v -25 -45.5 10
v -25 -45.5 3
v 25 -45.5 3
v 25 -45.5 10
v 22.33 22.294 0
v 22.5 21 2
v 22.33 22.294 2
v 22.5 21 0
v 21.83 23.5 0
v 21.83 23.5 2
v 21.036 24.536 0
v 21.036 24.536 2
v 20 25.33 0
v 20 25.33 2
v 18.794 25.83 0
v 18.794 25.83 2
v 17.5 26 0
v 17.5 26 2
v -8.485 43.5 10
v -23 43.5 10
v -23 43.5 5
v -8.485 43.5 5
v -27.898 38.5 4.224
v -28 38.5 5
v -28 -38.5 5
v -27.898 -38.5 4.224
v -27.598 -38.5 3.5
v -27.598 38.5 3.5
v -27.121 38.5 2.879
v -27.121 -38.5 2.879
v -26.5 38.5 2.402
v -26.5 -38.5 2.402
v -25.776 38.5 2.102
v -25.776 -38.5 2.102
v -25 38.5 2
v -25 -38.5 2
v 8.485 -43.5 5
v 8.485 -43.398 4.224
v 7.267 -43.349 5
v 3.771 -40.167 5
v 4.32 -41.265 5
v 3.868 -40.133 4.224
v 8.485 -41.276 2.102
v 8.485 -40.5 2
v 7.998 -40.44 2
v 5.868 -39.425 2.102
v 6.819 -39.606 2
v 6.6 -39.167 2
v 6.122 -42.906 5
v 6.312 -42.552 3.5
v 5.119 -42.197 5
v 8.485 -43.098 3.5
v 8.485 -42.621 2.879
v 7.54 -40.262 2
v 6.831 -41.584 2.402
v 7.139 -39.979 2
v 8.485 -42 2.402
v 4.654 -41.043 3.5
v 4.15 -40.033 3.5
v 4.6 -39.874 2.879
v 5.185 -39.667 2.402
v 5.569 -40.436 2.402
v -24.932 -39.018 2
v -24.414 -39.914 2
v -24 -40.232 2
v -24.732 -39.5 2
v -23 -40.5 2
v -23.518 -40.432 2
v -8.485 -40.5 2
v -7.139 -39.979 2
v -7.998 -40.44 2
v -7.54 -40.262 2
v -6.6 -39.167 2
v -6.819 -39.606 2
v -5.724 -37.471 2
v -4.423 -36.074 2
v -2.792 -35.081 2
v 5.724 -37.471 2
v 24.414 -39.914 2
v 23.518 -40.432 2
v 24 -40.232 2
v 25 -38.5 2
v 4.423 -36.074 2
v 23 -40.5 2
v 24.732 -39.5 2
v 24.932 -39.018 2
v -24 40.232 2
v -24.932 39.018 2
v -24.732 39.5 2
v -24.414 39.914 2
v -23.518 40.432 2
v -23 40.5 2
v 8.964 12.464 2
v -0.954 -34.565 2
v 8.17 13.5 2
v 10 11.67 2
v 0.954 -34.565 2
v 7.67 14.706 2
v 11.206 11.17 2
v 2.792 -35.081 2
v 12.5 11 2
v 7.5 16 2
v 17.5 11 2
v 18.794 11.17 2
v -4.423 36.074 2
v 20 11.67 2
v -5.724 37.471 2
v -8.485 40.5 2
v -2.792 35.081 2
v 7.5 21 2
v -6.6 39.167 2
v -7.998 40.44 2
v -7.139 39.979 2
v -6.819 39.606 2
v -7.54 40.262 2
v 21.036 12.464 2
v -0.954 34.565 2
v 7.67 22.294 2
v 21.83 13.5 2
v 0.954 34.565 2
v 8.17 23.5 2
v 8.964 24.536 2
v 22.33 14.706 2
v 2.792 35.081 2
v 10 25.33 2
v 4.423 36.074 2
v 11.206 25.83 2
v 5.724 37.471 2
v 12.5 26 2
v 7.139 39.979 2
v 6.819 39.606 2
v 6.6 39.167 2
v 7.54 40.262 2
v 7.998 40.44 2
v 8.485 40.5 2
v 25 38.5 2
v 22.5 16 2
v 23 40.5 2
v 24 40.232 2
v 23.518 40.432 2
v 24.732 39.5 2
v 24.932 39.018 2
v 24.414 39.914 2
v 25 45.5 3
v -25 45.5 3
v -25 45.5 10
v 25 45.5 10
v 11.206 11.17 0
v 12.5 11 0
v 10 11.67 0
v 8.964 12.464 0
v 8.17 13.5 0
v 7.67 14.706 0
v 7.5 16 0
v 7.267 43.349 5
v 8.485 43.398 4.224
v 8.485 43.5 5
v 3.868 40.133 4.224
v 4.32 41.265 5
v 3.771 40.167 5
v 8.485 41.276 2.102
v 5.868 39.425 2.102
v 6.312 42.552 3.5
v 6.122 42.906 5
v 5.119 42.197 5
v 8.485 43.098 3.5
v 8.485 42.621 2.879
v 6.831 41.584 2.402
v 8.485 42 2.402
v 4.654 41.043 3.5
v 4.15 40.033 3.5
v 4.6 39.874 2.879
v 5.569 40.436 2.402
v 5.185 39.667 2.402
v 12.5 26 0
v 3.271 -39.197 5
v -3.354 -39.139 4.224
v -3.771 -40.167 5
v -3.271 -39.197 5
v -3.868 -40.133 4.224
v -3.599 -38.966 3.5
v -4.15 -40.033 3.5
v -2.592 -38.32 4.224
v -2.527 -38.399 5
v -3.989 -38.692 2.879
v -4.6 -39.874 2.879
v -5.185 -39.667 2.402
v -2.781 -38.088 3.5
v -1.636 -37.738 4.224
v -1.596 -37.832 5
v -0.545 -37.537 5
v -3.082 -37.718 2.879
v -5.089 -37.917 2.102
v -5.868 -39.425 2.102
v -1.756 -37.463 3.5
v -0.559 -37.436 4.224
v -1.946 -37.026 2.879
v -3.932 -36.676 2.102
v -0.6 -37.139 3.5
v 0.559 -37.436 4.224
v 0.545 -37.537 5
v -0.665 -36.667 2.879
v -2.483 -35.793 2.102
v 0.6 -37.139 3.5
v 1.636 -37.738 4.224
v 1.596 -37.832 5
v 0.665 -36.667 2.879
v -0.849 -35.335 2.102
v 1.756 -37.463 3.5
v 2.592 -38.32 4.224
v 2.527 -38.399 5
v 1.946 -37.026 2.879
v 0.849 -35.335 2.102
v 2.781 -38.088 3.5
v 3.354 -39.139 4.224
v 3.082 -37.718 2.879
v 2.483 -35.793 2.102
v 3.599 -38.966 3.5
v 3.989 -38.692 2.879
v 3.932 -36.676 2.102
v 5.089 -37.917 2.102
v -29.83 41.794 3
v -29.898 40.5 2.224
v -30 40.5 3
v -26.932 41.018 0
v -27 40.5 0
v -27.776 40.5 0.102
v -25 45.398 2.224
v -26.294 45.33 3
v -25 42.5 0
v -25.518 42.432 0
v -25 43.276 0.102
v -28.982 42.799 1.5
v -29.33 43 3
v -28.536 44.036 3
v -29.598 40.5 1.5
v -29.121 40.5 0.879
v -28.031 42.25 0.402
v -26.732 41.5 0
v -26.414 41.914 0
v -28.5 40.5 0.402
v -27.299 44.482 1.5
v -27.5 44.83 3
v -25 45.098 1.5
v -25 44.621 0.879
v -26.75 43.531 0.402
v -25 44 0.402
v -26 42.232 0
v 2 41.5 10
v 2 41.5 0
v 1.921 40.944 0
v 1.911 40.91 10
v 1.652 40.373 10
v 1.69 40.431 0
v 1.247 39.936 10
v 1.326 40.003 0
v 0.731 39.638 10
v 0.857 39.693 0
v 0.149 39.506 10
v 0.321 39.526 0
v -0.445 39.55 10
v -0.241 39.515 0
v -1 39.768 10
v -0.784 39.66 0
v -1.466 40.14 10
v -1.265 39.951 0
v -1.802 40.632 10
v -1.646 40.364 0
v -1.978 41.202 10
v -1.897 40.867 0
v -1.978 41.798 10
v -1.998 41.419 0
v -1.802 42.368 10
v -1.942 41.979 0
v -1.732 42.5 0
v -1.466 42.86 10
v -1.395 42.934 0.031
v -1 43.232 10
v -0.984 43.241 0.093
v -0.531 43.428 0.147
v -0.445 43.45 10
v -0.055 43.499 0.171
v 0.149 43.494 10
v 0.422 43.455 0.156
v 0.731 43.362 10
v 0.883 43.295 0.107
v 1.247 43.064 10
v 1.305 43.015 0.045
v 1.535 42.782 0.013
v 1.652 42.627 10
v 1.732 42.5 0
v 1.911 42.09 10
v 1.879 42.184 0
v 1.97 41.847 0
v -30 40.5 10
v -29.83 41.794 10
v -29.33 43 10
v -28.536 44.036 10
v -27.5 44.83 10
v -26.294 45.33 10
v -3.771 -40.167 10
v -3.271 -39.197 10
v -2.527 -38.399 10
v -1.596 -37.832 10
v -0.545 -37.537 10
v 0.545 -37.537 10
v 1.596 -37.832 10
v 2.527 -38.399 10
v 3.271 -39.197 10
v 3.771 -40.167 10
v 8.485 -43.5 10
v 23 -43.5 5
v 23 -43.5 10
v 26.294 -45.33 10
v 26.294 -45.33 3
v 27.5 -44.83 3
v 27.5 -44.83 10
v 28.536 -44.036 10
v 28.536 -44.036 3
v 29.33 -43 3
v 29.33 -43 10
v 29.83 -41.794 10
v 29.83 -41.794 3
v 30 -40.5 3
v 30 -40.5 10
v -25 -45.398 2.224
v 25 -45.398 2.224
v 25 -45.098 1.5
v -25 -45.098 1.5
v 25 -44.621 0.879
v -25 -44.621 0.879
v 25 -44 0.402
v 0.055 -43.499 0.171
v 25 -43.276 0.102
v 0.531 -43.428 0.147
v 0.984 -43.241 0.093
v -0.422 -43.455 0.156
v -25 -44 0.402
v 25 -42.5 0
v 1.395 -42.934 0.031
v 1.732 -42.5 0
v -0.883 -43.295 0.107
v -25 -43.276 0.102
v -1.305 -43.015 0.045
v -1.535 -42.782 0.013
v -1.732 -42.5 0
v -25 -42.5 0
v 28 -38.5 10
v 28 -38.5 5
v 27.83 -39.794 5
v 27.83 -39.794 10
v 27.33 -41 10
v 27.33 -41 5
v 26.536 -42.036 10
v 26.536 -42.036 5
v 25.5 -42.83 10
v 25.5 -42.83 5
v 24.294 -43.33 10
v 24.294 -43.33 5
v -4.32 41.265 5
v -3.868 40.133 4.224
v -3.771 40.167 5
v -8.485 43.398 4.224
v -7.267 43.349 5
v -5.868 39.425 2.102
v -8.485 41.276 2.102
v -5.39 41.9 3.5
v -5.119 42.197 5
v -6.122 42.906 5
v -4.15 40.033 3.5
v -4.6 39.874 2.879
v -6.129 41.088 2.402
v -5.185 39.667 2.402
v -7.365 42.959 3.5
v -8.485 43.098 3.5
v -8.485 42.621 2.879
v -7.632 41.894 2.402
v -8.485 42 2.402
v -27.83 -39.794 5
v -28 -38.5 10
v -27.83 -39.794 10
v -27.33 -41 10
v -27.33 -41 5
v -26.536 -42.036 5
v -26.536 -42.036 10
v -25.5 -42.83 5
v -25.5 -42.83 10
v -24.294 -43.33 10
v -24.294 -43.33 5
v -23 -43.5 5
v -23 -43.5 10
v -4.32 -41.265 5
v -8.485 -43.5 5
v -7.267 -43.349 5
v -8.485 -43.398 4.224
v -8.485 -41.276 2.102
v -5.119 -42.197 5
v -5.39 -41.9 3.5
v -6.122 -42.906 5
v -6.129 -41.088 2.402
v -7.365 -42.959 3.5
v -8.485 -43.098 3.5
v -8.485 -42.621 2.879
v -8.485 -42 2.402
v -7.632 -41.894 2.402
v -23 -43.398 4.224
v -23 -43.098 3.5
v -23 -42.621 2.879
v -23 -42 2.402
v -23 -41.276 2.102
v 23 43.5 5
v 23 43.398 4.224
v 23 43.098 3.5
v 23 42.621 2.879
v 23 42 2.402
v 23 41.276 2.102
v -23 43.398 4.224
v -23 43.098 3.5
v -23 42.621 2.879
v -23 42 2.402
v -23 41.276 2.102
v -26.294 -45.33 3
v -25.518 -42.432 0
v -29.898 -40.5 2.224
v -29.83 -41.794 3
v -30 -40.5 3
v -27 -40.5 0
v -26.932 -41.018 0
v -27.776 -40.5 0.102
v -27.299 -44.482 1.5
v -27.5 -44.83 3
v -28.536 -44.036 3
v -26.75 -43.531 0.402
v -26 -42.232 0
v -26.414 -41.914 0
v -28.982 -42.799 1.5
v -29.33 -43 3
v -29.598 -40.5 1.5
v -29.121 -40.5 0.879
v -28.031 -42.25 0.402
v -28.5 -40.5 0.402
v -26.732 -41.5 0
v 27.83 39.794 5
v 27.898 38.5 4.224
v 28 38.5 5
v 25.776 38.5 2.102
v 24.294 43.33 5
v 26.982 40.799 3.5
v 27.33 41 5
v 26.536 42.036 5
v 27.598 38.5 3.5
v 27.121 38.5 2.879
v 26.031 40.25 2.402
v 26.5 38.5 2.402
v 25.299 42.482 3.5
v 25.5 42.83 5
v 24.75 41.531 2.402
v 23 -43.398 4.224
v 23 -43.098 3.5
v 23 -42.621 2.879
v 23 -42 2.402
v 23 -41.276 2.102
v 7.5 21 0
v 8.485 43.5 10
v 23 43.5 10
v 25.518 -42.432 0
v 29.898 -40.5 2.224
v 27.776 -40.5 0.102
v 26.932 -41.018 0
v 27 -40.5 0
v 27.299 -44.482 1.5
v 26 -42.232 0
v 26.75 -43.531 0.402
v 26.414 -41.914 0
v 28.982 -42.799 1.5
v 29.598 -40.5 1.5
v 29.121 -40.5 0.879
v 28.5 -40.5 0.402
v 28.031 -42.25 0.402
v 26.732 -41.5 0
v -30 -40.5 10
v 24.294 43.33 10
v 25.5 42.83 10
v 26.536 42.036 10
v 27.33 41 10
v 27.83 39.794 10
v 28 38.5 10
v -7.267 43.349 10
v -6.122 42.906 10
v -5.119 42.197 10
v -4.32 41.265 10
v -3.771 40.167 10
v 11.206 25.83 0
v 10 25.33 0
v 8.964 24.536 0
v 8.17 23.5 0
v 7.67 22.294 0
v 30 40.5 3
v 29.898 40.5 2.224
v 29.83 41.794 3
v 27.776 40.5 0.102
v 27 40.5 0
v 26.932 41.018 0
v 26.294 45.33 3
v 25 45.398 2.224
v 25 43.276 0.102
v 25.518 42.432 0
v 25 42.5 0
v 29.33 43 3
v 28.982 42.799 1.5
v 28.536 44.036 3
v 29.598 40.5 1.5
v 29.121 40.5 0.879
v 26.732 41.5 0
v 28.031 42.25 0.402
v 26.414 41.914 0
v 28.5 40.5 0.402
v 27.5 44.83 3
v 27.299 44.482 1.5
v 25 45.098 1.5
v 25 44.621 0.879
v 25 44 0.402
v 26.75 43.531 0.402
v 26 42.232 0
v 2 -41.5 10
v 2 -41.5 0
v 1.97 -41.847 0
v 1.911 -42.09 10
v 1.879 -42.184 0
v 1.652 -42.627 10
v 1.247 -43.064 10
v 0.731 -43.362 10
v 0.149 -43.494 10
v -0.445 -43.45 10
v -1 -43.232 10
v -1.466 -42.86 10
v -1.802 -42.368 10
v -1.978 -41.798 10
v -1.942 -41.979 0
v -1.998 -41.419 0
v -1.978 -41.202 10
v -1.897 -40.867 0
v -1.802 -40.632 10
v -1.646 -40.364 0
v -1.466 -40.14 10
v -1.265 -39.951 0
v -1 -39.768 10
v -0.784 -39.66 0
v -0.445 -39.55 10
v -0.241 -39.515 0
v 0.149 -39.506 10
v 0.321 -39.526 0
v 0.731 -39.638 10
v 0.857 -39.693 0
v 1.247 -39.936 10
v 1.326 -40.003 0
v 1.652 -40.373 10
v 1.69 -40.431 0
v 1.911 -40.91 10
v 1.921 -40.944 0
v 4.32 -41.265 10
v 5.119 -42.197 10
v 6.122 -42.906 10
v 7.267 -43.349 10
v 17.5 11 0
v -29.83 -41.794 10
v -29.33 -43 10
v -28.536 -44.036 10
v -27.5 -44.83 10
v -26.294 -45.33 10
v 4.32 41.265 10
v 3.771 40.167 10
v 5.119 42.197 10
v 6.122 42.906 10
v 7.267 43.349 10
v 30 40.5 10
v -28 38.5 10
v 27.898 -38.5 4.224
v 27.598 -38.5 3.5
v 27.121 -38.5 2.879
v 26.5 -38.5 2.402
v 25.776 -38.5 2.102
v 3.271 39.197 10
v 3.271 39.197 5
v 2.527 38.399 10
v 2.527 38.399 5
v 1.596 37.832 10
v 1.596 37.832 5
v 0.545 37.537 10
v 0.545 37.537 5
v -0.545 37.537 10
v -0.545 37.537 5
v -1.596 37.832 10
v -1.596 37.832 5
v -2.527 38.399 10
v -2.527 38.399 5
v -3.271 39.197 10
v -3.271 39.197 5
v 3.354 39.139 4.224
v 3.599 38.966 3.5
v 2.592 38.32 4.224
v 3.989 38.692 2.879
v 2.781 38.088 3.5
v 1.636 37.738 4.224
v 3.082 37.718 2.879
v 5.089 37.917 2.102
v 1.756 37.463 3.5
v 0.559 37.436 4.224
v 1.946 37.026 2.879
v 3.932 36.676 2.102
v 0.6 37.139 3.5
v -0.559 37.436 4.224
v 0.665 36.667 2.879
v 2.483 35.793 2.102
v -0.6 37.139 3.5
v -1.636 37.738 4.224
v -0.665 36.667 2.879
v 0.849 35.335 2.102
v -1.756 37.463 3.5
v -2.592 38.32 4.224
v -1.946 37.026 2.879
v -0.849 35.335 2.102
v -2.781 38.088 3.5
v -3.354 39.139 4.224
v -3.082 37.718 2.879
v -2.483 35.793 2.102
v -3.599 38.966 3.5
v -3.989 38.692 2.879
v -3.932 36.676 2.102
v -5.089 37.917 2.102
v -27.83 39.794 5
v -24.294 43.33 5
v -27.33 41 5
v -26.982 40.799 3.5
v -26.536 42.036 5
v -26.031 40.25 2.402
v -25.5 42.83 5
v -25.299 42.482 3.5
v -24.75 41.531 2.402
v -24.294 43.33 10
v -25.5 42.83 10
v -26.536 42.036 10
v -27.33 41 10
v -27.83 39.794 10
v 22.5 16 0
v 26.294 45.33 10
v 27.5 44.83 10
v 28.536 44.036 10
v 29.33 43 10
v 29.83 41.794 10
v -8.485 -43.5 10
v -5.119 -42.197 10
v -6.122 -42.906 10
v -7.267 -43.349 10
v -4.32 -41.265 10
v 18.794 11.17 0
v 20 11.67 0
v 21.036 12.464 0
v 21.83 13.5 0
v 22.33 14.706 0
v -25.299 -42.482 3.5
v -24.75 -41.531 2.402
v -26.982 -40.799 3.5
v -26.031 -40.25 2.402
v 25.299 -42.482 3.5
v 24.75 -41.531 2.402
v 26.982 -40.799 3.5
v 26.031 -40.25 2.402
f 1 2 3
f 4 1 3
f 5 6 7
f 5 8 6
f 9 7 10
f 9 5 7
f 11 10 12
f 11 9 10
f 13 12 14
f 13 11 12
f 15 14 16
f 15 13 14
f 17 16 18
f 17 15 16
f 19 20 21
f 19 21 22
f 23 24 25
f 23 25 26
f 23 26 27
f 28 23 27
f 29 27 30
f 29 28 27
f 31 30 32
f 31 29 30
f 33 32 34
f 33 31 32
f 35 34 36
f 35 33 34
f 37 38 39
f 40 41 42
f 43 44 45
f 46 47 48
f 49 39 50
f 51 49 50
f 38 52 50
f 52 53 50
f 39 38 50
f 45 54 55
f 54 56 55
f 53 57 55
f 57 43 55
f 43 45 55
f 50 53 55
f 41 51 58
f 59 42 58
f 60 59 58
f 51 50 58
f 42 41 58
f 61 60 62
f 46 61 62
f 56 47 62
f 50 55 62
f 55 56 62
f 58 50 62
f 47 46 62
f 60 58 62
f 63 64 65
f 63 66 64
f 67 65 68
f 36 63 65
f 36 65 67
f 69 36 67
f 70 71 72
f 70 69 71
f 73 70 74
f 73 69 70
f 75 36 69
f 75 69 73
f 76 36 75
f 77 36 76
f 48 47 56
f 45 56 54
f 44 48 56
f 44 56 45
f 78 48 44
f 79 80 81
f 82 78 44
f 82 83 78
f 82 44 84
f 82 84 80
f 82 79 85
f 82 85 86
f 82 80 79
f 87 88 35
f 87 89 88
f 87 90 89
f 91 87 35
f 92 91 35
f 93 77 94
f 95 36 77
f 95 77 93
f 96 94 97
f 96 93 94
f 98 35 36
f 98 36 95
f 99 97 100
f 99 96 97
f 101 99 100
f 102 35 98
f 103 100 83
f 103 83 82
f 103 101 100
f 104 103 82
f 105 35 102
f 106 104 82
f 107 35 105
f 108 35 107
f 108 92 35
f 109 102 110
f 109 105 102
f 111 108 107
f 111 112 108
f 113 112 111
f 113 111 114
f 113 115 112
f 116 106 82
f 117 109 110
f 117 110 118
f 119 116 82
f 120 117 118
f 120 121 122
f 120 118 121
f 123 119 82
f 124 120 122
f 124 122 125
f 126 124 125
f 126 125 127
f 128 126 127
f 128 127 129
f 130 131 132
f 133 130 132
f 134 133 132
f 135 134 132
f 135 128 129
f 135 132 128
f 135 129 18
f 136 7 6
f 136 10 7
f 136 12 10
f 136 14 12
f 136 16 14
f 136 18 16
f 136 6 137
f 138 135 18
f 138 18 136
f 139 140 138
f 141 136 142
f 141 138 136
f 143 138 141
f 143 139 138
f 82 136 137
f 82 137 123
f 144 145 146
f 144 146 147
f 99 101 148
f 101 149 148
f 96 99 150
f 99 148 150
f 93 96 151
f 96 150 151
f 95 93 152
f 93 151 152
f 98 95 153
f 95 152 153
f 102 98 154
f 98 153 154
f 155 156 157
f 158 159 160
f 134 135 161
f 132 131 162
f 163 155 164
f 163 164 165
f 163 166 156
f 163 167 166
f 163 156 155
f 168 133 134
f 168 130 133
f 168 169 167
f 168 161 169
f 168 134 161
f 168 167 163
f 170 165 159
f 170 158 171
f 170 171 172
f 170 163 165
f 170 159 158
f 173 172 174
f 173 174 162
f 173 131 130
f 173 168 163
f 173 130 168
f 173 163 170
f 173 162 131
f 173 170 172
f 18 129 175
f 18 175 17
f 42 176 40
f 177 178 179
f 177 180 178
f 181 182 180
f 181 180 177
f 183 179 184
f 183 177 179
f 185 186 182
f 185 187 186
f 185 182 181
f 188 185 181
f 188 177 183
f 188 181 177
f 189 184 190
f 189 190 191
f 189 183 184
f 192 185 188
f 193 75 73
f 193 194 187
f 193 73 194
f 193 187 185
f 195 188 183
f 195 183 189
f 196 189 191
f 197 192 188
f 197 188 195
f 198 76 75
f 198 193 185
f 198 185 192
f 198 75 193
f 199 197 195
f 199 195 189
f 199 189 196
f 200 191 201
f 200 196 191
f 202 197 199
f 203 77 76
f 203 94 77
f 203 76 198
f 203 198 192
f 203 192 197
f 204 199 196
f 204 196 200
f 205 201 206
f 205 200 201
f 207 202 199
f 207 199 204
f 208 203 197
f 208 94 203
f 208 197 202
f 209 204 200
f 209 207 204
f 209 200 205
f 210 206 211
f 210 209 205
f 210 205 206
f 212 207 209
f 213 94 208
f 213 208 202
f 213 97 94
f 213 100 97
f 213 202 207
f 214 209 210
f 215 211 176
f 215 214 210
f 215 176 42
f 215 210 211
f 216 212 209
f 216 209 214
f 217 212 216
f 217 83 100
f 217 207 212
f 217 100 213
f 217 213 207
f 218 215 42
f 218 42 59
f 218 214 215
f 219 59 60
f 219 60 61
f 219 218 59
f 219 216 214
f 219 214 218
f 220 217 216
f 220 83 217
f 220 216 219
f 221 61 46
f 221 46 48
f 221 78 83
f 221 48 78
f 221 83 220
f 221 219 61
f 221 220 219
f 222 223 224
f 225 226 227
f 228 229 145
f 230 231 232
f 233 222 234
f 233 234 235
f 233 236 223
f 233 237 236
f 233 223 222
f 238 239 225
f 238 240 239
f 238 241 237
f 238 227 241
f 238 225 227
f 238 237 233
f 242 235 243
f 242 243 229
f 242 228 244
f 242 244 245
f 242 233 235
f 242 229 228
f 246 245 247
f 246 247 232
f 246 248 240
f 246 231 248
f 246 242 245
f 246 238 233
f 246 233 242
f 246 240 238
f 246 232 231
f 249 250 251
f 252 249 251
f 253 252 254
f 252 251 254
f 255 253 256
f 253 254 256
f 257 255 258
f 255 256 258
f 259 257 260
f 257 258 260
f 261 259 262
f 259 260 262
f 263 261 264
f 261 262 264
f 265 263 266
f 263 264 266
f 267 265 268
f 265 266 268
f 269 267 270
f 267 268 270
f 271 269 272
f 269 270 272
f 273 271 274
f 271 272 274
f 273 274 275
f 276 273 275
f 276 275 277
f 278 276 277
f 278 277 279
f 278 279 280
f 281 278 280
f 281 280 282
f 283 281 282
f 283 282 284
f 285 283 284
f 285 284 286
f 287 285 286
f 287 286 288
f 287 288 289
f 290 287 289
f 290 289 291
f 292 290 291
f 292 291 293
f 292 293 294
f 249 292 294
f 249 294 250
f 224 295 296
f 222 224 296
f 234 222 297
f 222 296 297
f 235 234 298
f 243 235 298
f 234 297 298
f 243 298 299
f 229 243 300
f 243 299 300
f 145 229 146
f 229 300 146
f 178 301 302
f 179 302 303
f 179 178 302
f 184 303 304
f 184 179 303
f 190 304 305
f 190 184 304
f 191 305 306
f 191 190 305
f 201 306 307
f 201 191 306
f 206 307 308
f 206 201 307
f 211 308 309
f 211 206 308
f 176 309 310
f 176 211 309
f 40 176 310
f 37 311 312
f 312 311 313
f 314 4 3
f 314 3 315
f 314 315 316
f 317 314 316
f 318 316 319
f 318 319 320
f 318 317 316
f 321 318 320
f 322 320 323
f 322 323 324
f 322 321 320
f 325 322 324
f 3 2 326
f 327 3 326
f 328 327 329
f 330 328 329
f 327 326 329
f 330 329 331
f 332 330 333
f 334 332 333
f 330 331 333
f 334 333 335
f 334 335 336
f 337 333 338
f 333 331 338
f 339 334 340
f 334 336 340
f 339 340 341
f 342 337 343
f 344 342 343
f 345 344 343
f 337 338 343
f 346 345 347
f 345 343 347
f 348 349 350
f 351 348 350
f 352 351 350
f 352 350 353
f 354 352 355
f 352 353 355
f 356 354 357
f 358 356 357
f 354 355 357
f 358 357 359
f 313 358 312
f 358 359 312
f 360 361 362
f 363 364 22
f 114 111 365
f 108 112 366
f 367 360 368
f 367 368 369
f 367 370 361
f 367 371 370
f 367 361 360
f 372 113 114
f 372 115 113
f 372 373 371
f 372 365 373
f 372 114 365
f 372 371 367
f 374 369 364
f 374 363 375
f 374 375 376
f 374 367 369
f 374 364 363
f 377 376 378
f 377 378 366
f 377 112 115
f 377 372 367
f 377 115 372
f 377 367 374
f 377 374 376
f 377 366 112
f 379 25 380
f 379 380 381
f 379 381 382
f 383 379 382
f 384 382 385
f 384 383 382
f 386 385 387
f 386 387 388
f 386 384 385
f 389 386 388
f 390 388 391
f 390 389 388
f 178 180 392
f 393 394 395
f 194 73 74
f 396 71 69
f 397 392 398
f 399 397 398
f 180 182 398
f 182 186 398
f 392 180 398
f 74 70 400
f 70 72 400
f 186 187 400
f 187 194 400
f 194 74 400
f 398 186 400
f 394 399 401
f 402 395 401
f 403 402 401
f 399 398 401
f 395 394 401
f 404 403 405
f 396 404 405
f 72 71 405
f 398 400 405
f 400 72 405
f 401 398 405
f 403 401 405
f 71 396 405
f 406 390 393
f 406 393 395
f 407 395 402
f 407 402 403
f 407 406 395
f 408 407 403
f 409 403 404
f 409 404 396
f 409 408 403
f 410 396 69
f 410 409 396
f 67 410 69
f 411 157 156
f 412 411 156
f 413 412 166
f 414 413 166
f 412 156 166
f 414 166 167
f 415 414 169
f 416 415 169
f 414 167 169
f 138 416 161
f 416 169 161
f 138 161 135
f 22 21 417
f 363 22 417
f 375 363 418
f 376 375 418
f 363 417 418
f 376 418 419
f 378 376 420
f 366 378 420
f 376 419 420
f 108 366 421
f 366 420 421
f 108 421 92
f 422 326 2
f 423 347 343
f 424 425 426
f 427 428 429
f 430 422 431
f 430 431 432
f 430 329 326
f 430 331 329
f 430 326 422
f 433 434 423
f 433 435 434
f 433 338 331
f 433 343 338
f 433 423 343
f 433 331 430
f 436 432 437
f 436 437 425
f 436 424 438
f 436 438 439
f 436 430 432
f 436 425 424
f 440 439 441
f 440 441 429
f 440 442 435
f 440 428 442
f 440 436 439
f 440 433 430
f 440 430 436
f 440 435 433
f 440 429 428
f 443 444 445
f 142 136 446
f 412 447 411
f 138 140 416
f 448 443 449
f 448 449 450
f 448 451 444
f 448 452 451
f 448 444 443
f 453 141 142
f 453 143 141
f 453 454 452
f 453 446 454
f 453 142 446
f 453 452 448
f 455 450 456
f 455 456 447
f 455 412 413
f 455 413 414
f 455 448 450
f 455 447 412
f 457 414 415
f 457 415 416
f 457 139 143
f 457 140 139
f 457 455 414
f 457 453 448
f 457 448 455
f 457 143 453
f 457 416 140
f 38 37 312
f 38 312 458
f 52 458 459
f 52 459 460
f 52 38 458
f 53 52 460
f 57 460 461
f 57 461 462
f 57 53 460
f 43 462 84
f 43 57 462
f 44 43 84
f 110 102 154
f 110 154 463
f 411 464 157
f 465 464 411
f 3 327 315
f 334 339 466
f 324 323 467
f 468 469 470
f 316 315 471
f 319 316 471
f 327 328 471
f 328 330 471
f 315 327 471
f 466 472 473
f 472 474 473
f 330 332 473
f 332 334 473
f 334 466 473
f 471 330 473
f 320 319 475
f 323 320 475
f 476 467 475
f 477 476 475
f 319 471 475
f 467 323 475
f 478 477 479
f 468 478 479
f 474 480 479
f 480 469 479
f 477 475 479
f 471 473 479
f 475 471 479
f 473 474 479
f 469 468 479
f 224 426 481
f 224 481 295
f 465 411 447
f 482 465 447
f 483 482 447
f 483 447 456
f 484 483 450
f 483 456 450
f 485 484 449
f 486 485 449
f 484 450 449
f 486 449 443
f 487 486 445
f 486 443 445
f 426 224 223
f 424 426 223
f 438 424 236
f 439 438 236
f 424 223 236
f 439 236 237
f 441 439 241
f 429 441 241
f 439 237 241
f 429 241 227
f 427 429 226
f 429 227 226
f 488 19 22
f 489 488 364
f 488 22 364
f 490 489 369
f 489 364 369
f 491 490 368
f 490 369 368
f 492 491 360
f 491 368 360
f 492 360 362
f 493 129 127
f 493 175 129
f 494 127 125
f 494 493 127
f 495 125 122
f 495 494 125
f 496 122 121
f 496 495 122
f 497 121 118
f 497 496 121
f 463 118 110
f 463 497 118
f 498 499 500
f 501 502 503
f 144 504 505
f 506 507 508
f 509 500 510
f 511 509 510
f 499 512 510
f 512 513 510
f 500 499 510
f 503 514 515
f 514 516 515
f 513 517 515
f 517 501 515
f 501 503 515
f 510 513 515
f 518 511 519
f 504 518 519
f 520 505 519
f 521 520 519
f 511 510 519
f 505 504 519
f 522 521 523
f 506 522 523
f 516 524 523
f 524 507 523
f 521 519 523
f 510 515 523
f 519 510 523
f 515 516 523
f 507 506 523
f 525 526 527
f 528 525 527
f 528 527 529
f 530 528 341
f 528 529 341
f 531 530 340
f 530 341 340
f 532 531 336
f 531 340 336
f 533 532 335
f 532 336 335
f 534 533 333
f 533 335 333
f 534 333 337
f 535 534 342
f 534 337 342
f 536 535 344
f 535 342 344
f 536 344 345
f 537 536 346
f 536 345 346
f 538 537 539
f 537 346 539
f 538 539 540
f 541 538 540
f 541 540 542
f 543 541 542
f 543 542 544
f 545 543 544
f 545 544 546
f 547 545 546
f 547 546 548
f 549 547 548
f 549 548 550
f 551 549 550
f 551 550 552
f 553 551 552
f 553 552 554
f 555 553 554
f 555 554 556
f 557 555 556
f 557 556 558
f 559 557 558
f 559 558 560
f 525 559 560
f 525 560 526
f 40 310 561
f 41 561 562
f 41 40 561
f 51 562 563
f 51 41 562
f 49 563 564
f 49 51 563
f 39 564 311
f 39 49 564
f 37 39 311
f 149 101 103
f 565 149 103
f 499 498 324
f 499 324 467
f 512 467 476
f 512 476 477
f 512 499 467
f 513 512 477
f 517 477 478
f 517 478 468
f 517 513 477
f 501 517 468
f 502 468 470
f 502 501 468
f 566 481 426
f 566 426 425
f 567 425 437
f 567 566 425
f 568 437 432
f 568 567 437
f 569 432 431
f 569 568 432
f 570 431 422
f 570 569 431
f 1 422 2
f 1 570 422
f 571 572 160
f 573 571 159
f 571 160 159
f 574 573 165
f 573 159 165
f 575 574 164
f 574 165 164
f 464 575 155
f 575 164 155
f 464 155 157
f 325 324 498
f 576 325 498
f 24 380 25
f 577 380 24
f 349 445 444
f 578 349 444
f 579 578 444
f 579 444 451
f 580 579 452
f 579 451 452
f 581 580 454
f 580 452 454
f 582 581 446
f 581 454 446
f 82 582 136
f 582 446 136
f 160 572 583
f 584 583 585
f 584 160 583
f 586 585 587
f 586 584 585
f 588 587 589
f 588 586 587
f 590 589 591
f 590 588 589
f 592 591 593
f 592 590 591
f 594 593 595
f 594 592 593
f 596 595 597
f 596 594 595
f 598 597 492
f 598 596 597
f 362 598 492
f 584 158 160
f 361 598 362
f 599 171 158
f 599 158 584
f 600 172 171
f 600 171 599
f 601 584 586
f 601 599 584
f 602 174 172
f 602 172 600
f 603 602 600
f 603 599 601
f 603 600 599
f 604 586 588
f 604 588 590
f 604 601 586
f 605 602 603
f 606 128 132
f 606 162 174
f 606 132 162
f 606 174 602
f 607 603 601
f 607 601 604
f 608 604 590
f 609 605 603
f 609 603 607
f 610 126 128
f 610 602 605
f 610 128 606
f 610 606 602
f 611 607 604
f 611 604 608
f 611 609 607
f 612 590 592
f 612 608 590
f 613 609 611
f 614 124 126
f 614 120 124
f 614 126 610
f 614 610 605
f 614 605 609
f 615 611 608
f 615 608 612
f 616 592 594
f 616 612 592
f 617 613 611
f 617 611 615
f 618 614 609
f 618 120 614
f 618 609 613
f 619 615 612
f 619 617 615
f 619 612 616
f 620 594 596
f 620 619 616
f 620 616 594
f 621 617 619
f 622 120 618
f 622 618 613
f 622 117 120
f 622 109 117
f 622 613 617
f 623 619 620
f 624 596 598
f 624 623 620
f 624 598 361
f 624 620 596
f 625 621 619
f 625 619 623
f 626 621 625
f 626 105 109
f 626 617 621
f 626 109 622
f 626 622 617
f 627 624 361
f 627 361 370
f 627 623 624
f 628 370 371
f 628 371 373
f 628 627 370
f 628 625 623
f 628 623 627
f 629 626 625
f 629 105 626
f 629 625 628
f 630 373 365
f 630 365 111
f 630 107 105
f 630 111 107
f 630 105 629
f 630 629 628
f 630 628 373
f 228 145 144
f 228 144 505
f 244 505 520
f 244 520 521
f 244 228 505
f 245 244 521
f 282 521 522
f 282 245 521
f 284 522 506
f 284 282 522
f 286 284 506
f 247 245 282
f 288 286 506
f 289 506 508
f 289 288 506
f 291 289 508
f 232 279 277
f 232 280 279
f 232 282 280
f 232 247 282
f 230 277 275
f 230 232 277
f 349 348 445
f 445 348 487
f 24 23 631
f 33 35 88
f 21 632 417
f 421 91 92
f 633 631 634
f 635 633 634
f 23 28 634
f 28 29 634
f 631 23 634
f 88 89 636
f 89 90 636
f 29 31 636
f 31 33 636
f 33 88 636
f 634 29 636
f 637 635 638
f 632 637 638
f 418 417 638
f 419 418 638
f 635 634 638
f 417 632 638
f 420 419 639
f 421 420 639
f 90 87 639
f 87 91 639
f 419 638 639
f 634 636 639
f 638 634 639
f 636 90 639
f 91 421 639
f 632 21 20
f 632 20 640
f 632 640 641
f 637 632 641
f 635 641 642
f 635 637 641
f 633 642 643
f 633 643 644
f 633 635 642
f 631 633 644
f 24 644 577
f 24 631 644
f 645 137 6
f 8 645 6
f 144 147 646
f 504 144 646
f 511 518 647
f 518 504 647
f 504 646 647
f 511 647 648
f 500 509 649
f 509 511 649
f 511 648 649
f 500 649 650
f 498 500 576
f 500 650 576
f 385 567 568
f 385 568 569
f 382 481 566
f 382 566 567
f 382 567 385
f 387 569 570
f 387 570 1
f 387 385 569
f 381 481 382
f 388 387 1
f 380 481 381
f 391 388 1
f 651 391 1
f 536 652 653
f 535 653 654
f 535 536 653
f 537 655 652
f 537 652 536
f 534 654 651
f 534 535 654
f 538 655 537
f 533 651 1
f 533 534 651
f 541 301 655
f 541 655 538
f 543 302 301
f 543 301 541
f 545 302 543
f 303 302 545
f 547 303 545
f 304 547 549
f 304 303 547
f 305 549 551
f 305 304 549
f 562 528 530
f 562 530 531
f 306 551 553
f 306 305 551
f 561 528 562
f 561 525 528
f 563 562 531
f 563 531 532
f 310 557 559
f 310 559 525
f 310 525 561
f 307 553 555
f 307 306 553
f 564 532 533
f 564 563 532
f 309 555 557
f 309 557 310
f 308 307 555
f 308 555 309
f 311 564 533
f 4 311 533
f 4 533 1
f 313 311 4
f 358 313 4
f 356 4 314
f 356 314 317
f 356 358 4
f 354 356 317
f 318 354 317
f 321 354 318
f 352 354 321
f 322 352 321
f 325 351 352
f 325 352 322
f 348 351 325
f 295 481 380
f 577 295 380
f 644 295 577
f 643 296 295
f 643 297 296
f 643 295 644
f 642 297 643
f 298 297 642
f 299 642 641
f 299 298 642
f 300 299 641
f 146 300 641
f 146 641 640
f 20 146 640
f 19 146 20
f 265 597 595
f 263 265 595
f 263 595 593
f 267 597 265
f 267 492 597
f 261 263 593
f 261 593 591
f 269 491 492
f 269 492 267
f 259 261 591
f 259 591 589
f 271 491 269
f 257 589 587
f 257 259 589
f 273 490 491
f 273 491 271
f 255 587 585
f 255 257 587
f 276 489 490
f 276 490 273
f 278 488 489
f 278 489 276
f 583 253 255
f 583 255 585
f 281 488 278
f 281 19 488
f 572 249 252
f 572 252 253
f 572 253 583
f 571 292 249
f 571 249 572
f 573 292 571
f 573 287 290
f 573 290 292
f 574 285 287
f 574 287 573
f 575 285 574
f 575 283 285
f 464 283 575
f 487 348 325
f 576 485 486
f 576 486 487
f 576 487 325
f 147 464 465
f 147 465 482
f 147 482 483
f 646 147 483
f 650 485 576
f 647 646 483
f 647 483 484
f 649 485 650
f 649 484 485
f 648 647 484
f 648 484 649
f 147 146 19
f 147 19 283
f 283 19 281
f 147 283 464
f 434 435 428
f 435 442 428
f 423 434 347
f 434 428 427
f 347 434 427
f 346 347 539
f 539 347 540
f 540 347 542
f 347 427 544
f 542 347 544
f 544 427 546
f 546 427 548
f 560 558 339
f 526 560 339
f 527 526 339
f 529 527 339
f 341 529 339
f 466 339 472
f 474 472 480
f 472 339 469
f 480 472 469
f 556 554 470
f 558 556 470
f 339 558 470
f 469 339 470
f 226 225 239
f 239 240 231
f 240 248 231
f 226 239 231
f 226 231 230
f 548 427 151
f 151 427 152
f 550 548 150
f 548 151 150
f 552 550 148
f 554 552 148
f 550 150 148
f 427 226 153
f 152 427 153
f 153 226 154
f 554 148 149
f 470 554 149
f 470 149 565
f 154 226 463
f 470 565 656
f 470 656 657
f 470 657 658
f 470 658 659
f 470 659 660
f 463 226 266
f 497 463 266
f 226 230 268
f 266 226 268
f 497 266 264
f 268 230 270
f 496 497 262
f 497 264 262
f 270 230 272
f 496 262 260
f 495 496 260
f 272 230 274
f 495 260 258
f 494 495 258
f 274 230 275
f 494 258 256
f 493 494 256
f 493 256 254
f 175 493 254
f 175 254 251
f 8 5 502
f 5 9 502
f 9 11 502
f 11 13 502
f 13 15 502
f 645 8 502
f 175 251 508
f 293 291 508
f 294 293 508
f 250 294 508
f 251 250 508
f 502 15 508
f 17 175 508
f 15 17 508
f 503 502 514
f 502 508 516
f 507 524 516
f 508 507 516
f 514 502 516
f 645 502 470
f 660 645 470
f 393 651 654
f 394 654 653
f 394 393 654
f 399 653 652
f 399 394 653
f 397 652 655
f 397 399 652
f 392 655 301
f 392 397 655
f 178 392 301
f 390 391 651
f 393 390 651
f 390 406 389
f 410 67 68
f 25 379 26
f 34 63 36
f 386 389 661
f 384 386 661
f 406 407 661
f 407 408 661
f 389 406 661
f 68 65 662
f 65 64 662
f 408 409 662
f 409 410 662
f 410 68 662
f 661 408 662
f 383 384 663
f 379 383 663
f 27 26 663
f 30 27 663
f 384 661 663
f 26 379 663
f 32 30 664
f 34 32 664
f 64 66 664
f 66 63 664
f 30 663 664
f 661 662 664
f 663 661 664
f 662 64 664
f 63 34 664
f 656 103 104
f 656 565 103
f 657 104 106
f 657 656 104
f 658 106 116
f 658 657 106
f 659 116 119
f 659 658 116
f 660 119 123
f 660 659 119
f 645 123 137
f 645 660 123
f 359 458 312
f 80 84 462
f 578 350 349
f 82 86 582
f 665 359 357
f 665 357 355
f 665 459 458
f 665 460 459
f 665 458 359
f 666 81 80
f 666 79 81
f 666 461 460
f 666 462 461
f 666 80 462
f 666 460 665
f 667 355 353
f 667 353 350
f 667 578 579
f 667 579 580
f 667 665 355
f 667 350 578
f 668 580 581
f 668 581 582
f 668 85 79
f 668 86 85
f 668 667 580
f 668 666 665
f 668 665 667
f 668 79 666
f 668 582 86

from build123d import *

# Parameters (mm, degrees)
F3_W          = 60
F3_H          = 91
F4_DEPTH      = 10
F5_W          = 56
F5_H          = 87
F6_DEPTH      = 8
F7_R          = 4
F8_DEPTH      = 10
F9_R          = 2
F10_DEPTH     = 10.001
F11_R         = 5
F12_R         = 5
F13_T1_DEPTH  = 77
F13_T3_DEPTH  = 14.5147186258
F13_T5_DEPTH  = 14.5147186258
F13_T8_ANGLE  = 90
F13_T10_ANGLE = 70.5287793655
F13_T12_ANGLE = 141.057558731
F13_T14_ANGLE = 90
F13_T16_ANGLE = 70.5287793655
F13_T18_ANGLE = 70.5287793655
F13_T20_ANGLE = 90
F13_T22_ANGLE = 141.057558731
F13_T24_ANGLE = 70.5287793655
F13_T26_ANGLE = 90
F13_T27_DEPTH = 81
F13_T29_DEPTH = 50
F13_T32_ANGLE = 90
F13_T34_ANGLE = 90
F13_T36_ANGLE = 90
F13_T38_ANGLE = 90
F14_W         = 15
F14_H         = 15
F15_DEPTH     = 2.0010001
F16_R         = 5


# Not quite as in the source:
# - a fillet or chamfer that OpenCascade refuses, or shapes differently, is made with other operations: its cross-section is extruded or revolved along the edge and cut away or added


with BuildPart() as f4:
    # F3 (on Top) → F4 (new body)
    with BuildSketch(Plane.XY):
        Rectangle(F3_W, F3_H)
    extrude(amount=F4_DEPTH)

    # F5 (on face) → F6 (cut)
    with BuildSketch(Plane.XY.offset(10)):
        Rectangle(F5_W, F5_H)
    extrude(amount=-F6_DEPTH, mode=Mode.SUBTRACT)

    # F7 (on face) → F8 (join)
    with BuildSketch(Plane(origin=(0, 0, 0), x_dir=(1, 0, 0), z_dir=(0, 0, -1))):
        with Locations((0, -41.5)):
            Circle(F7_R)
        with Locations((0, 41.5)):
            Circle(F7_R)
    extrude(amount=-F8_DEPTH)

    # F9 (on face) → F10 (cut, through all)
    with BuildSketch(Plane(origin=(0, 0, 0), x_dir=(1, 0, 0), z_dir=(0, 0, -1))):
        with Locations((0, -41.5)):
            Circle(F9_R)
        with Locations((0, 41.5)):
            Circle(F9_R)
    extrude(amount=-F10_DEPTH, mode=Mode.SUBTRACT)

    # F11
    f11_edges = [f4.edges().sort_by_distance(p)[0] for p in [
        (3.464102, 43.5, 6),
        (-3.464102, 43.5, 6),
        (-3.464102, -43.5, 6),
        (3.464102, -43.5, 6),
    ]]
    fillet(f11_edges, radius=F11_R)

    # F12
    f12_edges = [f4.edges().sort_by_distance(p)[0] for p in [
        (30, -45.5, 5),
        (-30, -45.5, 5),
        (30, 45.5, 5),
        (-30, 45.5, 5),
        (28, -43.5, 6),
        (-28, -43.5, 6),
        (-28, 43.5, 6),
        (28, 43.5, 6),
    ]]
    fillet(f12_edges, radius=F12_R)

    # F13: fillet of radius 3 on 24 edges, made by hand

    # F13_s2 → F13_t1 (join)
    with BuildSketch(Plane.XZ.offset(-38.5)):
        with BuildLine():
            ThreePointArc((-28, 5), (-27.1213203436, 2.8786796564), (-25, 2))
            Line((-25, 2), (-28, 2))
            Line((-28, 2), (-28, 5))
        make_face()
        with BuildLine():
            ThreePointArc((28, 5), (27.1213203436, 2.8786796564), (25, 2))
            Line((25, 2), (28, 2))
            Line((28, 2), (28, 5))
        make_face()
    extrude(amount=F13_T1_DEPTH)

    # F13_s4 → F13_t3 (join)
    with BuildSketch(Plane.YZ.offset(8.4852813742)):
        with BuildLine():
            ThreePointArc((-43.5, 5), (-42.6213203436, 2.8786796564), (-40.5, 2))
            Line((-40.5, 2), (-43.5, 2))
            Line((-43.5, 2), (-43.5, 5))
        make_face()
        with BuildLine():
            ThreePointArc((43.5, 5), (42.6213203436, 2.8786796564), (40.5, 2))
            Line((40.5, 2), (43.5, 2))
            Line((43.5, 2), (43.5, 5))
        make_face()
    extrude(amount=F13_T3_DEPTH)

    # F13_s6 → F13_t5 (join)
    with BuildSketch(Plane.YZ.offset(-23)):
        with BuildLine():
            ThreePointArc((-43.5, 5), (-42.6213203436, 2.8786796564), (-40.5, 2))
            Line((-40.5, 2), (-43.5, 2))
            Line((-43.5, 2), (-43.5, 5))
        make_face()
        with BuildLine():
            ThreePointArc((43.5, 5), (42.6213203436, 2.8786796564), (40.5, 2))
            Line((40.5, 2), (43.5, 2))
            Line((43.5, 2), (43.5, 5))
        make_face()
    extrude(amount=F13_T5_DEPTH)

    # F13_s7 → F13_t8 (revolve)
    with BuildSketch(Plane.YZ.offset(23)):
        with BuildLine():
            ThreePointArc((-43.5, 5), (-42.6213203436, 2.8786796564), (-40.5, 2))
            Line((-40.5, 2), (-43.5, 2))
            Line((-43.5, 2), (-43.5, 5))
        make_face()
    revolve(axis=Axis((23, -38.5, 2), (0, 0, 1)), revolution_arc=F13_T8_ANGLE)

    # F13_s9 → F13_t10 (revolve)
    with BuildSketch(Plane.YZ.offset(8.4852813742)):
        with BuildLine():
            ThreePointArc((-43.5, 5), (-42.6213203436, 2.8786796564), (-40.5, 2))
            Line((-40.5, 2), (-43.5, 2))
            Line((-43.5, 2), (-43.5, 5))
        make_face()
    revolve(axis=Axis((8.4852813742, -38.5, 2), (0, 0, -1)), revolution_arc=F13_T10_ANGLE)

    # F13_s11 → F13_t12 (revolve)
    with BuildSketch(Plane(origin=(-13.0421917419, -36.8888888889, 0), x_dir=(0, 0, 1), z_dir=(-0.3333333333, -0.9428090416, 0))):
        with BuildLine():
            ThreePointArc((5, -9.8333333333), (2.8786796564, -8.9546536769), (2, -6.8333333333))
            Line((2, -6.8333333333), (2, -9.8333333333))
            Line((2, -9.8333333333), (5, -9.8333333333))
        make_face()
    revolve(axis=Axis((0, -41.5, 2), (0, 0, -1)), revolution_arc=F13_T12_ANGLE)

    # F13_s13 → F13_t14 (revolve)
    with BuildSketch(Plane.XZ.offset(-38.5)):
        with BuildLine():
            ThreePointArc((28, 5), (27.1213203436, 2.8786796564), (25, 2))
            Line((25, 2), (28, 2))
            Line((28, 2), (28, 5))
        make_face()
    revolve(axis=Axis((23, 38.5, 2), (0, 0, 1)), revolution_arc=F13_T14_ANGLE)

    # F13_s15 → F13_t16 (revolve)
    with BuildSketch(Plane(origin=(-13.0421917419, -36.8888888889, 0), x_dir=(0, 0, 1), z_dir=(0.3333333333, 0.9428090416, 0))):
        with BuildLine():
            ThreePointArc((5, 9.8333333333), (2.8786796564, 8.9546536769), (2, 6.8333333333))
            Line((2, 6.8333333333), (2, 9.8333333333))
            Line((2, 9.8333333333), (5, 9.8333333333))
        make_face()
    revolve(axis=Axis((-8.4852813742, -38.5, 2), (0, 0, -1)), revolution_arc=F13_T16_ANGLE)

    # F13_s17 → F13_t18 (revolve)
    with BuildSketch(Plane.YZ.offset(8.4852813742)):
        with BuildLine():
            ThreePointArc((43.5, 5), (42.6213203436, 2.8786796564), (40.5, 2))
            Line((40.5, 2), (43.5, 2))
            Line((43.5, 2), (43.5, 5))
        make_face()
    revolve(axis=Axis((8.4852813742, 38.5, 2), (0, 0, 1)), revolution_arc=F13_T18_ANGLE)

    # F13_s19 → F13_t20 (revolve)
    with BuildSketch(Plane.YZ.offset(-23)):
        with BuildLine():
            ThreePointArc((-43.5, 5), (-42.6213203436, 2.8786796564), (-40.5, 2))
            Line((-40.5, 2), (-43.5, 2))
            Line((-43.5, 2), (-43.5, 5))
        make_face()
    revolve(axis=Axis((-23, -38.5, 2), (0, 0, -1)), revolution_arc=F13_T20_ANGLE)

    # F13_s21 → F13_t22 (revolve)
    with BuildSketch(Plane(origin=(13.0421917419, 36.8888888889, 0), x_dir=(0, 0, 1), z_dir=(0.3333333333, 0.9428090416, 0))):
        with BuildLine():
            ThreePointArc((5, -9.8333333333), (2.8786796564, -8.9546536769), (2, -6.8333333333))
            Line((2, -6.8333333333), (2, -9.8333333333))
            Line((2, -9.8333333333), (5, -9.8333333333))
        make_face()
    revolve(axis=Axis((0, 41.5, 2), (0, 0, -1)), revolution_arc=F13_T22_ANGLE)

    # F13_s23 → F13_t24 (revolve)
    with BuildSketch(Plane(origin=(-13.0421917419, 36.8888888889, 0), x_dir=(0, 0, 1), z_dir=(0.3333333333, -0.9428090416, 0))):
        with BuildLine():
            ThreePointArc((5, -9.8333333333), (2.8786796564, -8.9546536769), (2, -6.8333333333))
            Line((2, -6.8333333333), (2, -9.8333333333))
            Line((2, -9.8333333333), (5, -9.8333333333))
        make_face()
    revolve(axis=Axis((-8.4852813742, 38.5, 2), (0, 0, 1)), revolution_arc=F13_T24_ANGLE)

    # F13_s25 → F13_t26 (revolve)
    with BuildSketch(Plane.XZ.offset(-38.5)):
        with BuildLine():
            ThreePointArc((-28, 5), (-27.1213203436, 2.8786796564), (-25, 2))
            Line((-25, 2), (-28, 2))
            Line((-28, 2), (-28, 5))
        make_face()
    revolve(axis=Axis((-23, 38.5, 2), (0, 0, -1)), revolution_arc=F13_T26_ANGLE)

    # F13_s28 → F13_t27 (cut)
    with BuildSketch(Plane.XZ.offset(-40.5)):
        with BuildLine():
            ThreePointArc((30, 3), (29.1213203436, 0.8786796564), (27, 0))
            Line((27, 0), (30, 0))
            Line((30, 0), (30, 3))
        make_face()
        with BuildLine():
            ThreePointArc((-30, 3), (-29.1213203436, 0.8786796564), (-27, 0))
            Line((-27, 0), (-30, 0))
            Line((-30, 0), (-30, 3))
        make_face()
    extrude(amount=F13_T27_DEPTH, mode=Mode.SUBTRACT)

    # F13_s30 → F13_t29 (cut)
    with BuildSketch(Plane.YZ.offset(-25)):
        with BuildLine():
            ThreePointArc((-45.5, 3), (-44.6213203436, 0.8786796564), (-42.5, 0))
            Line((-42.5, 0), (-45.5, 0))
            Line((-45.5, 0), (-45.5, 3))
        make_face()
        with BuildLine():
            ThreePointArc((45.5, 3), (44.6213203436, 0.8786796564), (42.5, 0))
            Line((42.5, 0), (45.5, 0))
            Line((45.5, 0), (45.5, 3))
        make_face()
    extrude(amount=F13_T29_DEPTH, mode=Mode.SUBTRACT)

    # F13_s31 → F13_t32 (revolve, cut)
    with BuildSketch(Plane.YZ.offset(25)):
        with BuildLine():
            ThreePointArc((-45.5, 3), (-44.6213203436, 0.8786796564), (-42.5, 0))
            Line((-42.5, 0), (-45.5, 0))
            Line((-45.5, 0), (-45.5, 3))
        make_face()
    revolve(axis=Axis((25, -40.5, 0), (0, 0, 1)), revolution_arc=F13_T32_ANGLE, mode=Mode.SUBTRACT)

    # F13_s33 → F13_t34 (revolve, cut)
    with BuildSketch(Plane.YZ.offset(-25)):
        with BuildLine():
            ThreePointArc((-45.5, 3), (-44.6213203436, 0.8786796564), (-42.5, 0))
            Line((-42.5, 0), (-45.5, 0))
            Line((-45.5, 0), (-45.5, 3))
        make_face()
    revolve(axis=Axis((-25, -40.5, 0), (0, 0, -1)), revolution_arc=F13_T34_ANGLE, mode=Mode.SUBTRACT)

    # F13_s35 → F13_t36 (revolve, cut)
    with BuildSketch(Plane.XZ.offset(-40.5)):
        with BuildLine():
            ThreePointArc((30, 3), (29.1213203436, 0.8786796564), (27, 0))
            Line((27, 0), (30, 0))
            Line((30, 0), (30, 3))
        make_face()
    revolve(axis=Axis((25, 40.5, 0), (0, 0, 1)), revolution_arc=F13_T36_ANGLE, mode=Mode.SUBTRACT)

    # F13_s37 → F13_t38 (revolve, cut)
    with BuildSketch(Plane.XZ.offset(-40.5)):
        with BuildLine():
            ThreePointArc((-30, 3), (-29.1213203436, 0.8786796564), (-27, 0))
            Line((-27, 0), (-30, 0))
            Line((-30, 0), (-30, 3))
        make_face()
    revolve(axis=Axis((-25, 40.5, 0), (0, 0, -1)), revolution_arc=F13_T38_ANGLE, mode=Mode.SUBTRACT)

    # F14 (on face) → F15 (cut, through all)
    with BuildSketch(Plane.XY.offset(2)):
        with Locations((15, 18.5)):
            Rectangle(F14_W, F14_H)
    extrude(amount=-F15_DEPTH, mode=Mode.SUBTRACT)

    # F16
    f16_edges = [f4.edges().sort_by_distance(p)[0] for p in [
        (7.5, 26, 1),
        (22.5, 26, 1),
        (22.5, 11, 1),
        (7.5, 11, 1),
    ]]
    fillet(f16_edges, radius=F16_R)


solid = f4.part
